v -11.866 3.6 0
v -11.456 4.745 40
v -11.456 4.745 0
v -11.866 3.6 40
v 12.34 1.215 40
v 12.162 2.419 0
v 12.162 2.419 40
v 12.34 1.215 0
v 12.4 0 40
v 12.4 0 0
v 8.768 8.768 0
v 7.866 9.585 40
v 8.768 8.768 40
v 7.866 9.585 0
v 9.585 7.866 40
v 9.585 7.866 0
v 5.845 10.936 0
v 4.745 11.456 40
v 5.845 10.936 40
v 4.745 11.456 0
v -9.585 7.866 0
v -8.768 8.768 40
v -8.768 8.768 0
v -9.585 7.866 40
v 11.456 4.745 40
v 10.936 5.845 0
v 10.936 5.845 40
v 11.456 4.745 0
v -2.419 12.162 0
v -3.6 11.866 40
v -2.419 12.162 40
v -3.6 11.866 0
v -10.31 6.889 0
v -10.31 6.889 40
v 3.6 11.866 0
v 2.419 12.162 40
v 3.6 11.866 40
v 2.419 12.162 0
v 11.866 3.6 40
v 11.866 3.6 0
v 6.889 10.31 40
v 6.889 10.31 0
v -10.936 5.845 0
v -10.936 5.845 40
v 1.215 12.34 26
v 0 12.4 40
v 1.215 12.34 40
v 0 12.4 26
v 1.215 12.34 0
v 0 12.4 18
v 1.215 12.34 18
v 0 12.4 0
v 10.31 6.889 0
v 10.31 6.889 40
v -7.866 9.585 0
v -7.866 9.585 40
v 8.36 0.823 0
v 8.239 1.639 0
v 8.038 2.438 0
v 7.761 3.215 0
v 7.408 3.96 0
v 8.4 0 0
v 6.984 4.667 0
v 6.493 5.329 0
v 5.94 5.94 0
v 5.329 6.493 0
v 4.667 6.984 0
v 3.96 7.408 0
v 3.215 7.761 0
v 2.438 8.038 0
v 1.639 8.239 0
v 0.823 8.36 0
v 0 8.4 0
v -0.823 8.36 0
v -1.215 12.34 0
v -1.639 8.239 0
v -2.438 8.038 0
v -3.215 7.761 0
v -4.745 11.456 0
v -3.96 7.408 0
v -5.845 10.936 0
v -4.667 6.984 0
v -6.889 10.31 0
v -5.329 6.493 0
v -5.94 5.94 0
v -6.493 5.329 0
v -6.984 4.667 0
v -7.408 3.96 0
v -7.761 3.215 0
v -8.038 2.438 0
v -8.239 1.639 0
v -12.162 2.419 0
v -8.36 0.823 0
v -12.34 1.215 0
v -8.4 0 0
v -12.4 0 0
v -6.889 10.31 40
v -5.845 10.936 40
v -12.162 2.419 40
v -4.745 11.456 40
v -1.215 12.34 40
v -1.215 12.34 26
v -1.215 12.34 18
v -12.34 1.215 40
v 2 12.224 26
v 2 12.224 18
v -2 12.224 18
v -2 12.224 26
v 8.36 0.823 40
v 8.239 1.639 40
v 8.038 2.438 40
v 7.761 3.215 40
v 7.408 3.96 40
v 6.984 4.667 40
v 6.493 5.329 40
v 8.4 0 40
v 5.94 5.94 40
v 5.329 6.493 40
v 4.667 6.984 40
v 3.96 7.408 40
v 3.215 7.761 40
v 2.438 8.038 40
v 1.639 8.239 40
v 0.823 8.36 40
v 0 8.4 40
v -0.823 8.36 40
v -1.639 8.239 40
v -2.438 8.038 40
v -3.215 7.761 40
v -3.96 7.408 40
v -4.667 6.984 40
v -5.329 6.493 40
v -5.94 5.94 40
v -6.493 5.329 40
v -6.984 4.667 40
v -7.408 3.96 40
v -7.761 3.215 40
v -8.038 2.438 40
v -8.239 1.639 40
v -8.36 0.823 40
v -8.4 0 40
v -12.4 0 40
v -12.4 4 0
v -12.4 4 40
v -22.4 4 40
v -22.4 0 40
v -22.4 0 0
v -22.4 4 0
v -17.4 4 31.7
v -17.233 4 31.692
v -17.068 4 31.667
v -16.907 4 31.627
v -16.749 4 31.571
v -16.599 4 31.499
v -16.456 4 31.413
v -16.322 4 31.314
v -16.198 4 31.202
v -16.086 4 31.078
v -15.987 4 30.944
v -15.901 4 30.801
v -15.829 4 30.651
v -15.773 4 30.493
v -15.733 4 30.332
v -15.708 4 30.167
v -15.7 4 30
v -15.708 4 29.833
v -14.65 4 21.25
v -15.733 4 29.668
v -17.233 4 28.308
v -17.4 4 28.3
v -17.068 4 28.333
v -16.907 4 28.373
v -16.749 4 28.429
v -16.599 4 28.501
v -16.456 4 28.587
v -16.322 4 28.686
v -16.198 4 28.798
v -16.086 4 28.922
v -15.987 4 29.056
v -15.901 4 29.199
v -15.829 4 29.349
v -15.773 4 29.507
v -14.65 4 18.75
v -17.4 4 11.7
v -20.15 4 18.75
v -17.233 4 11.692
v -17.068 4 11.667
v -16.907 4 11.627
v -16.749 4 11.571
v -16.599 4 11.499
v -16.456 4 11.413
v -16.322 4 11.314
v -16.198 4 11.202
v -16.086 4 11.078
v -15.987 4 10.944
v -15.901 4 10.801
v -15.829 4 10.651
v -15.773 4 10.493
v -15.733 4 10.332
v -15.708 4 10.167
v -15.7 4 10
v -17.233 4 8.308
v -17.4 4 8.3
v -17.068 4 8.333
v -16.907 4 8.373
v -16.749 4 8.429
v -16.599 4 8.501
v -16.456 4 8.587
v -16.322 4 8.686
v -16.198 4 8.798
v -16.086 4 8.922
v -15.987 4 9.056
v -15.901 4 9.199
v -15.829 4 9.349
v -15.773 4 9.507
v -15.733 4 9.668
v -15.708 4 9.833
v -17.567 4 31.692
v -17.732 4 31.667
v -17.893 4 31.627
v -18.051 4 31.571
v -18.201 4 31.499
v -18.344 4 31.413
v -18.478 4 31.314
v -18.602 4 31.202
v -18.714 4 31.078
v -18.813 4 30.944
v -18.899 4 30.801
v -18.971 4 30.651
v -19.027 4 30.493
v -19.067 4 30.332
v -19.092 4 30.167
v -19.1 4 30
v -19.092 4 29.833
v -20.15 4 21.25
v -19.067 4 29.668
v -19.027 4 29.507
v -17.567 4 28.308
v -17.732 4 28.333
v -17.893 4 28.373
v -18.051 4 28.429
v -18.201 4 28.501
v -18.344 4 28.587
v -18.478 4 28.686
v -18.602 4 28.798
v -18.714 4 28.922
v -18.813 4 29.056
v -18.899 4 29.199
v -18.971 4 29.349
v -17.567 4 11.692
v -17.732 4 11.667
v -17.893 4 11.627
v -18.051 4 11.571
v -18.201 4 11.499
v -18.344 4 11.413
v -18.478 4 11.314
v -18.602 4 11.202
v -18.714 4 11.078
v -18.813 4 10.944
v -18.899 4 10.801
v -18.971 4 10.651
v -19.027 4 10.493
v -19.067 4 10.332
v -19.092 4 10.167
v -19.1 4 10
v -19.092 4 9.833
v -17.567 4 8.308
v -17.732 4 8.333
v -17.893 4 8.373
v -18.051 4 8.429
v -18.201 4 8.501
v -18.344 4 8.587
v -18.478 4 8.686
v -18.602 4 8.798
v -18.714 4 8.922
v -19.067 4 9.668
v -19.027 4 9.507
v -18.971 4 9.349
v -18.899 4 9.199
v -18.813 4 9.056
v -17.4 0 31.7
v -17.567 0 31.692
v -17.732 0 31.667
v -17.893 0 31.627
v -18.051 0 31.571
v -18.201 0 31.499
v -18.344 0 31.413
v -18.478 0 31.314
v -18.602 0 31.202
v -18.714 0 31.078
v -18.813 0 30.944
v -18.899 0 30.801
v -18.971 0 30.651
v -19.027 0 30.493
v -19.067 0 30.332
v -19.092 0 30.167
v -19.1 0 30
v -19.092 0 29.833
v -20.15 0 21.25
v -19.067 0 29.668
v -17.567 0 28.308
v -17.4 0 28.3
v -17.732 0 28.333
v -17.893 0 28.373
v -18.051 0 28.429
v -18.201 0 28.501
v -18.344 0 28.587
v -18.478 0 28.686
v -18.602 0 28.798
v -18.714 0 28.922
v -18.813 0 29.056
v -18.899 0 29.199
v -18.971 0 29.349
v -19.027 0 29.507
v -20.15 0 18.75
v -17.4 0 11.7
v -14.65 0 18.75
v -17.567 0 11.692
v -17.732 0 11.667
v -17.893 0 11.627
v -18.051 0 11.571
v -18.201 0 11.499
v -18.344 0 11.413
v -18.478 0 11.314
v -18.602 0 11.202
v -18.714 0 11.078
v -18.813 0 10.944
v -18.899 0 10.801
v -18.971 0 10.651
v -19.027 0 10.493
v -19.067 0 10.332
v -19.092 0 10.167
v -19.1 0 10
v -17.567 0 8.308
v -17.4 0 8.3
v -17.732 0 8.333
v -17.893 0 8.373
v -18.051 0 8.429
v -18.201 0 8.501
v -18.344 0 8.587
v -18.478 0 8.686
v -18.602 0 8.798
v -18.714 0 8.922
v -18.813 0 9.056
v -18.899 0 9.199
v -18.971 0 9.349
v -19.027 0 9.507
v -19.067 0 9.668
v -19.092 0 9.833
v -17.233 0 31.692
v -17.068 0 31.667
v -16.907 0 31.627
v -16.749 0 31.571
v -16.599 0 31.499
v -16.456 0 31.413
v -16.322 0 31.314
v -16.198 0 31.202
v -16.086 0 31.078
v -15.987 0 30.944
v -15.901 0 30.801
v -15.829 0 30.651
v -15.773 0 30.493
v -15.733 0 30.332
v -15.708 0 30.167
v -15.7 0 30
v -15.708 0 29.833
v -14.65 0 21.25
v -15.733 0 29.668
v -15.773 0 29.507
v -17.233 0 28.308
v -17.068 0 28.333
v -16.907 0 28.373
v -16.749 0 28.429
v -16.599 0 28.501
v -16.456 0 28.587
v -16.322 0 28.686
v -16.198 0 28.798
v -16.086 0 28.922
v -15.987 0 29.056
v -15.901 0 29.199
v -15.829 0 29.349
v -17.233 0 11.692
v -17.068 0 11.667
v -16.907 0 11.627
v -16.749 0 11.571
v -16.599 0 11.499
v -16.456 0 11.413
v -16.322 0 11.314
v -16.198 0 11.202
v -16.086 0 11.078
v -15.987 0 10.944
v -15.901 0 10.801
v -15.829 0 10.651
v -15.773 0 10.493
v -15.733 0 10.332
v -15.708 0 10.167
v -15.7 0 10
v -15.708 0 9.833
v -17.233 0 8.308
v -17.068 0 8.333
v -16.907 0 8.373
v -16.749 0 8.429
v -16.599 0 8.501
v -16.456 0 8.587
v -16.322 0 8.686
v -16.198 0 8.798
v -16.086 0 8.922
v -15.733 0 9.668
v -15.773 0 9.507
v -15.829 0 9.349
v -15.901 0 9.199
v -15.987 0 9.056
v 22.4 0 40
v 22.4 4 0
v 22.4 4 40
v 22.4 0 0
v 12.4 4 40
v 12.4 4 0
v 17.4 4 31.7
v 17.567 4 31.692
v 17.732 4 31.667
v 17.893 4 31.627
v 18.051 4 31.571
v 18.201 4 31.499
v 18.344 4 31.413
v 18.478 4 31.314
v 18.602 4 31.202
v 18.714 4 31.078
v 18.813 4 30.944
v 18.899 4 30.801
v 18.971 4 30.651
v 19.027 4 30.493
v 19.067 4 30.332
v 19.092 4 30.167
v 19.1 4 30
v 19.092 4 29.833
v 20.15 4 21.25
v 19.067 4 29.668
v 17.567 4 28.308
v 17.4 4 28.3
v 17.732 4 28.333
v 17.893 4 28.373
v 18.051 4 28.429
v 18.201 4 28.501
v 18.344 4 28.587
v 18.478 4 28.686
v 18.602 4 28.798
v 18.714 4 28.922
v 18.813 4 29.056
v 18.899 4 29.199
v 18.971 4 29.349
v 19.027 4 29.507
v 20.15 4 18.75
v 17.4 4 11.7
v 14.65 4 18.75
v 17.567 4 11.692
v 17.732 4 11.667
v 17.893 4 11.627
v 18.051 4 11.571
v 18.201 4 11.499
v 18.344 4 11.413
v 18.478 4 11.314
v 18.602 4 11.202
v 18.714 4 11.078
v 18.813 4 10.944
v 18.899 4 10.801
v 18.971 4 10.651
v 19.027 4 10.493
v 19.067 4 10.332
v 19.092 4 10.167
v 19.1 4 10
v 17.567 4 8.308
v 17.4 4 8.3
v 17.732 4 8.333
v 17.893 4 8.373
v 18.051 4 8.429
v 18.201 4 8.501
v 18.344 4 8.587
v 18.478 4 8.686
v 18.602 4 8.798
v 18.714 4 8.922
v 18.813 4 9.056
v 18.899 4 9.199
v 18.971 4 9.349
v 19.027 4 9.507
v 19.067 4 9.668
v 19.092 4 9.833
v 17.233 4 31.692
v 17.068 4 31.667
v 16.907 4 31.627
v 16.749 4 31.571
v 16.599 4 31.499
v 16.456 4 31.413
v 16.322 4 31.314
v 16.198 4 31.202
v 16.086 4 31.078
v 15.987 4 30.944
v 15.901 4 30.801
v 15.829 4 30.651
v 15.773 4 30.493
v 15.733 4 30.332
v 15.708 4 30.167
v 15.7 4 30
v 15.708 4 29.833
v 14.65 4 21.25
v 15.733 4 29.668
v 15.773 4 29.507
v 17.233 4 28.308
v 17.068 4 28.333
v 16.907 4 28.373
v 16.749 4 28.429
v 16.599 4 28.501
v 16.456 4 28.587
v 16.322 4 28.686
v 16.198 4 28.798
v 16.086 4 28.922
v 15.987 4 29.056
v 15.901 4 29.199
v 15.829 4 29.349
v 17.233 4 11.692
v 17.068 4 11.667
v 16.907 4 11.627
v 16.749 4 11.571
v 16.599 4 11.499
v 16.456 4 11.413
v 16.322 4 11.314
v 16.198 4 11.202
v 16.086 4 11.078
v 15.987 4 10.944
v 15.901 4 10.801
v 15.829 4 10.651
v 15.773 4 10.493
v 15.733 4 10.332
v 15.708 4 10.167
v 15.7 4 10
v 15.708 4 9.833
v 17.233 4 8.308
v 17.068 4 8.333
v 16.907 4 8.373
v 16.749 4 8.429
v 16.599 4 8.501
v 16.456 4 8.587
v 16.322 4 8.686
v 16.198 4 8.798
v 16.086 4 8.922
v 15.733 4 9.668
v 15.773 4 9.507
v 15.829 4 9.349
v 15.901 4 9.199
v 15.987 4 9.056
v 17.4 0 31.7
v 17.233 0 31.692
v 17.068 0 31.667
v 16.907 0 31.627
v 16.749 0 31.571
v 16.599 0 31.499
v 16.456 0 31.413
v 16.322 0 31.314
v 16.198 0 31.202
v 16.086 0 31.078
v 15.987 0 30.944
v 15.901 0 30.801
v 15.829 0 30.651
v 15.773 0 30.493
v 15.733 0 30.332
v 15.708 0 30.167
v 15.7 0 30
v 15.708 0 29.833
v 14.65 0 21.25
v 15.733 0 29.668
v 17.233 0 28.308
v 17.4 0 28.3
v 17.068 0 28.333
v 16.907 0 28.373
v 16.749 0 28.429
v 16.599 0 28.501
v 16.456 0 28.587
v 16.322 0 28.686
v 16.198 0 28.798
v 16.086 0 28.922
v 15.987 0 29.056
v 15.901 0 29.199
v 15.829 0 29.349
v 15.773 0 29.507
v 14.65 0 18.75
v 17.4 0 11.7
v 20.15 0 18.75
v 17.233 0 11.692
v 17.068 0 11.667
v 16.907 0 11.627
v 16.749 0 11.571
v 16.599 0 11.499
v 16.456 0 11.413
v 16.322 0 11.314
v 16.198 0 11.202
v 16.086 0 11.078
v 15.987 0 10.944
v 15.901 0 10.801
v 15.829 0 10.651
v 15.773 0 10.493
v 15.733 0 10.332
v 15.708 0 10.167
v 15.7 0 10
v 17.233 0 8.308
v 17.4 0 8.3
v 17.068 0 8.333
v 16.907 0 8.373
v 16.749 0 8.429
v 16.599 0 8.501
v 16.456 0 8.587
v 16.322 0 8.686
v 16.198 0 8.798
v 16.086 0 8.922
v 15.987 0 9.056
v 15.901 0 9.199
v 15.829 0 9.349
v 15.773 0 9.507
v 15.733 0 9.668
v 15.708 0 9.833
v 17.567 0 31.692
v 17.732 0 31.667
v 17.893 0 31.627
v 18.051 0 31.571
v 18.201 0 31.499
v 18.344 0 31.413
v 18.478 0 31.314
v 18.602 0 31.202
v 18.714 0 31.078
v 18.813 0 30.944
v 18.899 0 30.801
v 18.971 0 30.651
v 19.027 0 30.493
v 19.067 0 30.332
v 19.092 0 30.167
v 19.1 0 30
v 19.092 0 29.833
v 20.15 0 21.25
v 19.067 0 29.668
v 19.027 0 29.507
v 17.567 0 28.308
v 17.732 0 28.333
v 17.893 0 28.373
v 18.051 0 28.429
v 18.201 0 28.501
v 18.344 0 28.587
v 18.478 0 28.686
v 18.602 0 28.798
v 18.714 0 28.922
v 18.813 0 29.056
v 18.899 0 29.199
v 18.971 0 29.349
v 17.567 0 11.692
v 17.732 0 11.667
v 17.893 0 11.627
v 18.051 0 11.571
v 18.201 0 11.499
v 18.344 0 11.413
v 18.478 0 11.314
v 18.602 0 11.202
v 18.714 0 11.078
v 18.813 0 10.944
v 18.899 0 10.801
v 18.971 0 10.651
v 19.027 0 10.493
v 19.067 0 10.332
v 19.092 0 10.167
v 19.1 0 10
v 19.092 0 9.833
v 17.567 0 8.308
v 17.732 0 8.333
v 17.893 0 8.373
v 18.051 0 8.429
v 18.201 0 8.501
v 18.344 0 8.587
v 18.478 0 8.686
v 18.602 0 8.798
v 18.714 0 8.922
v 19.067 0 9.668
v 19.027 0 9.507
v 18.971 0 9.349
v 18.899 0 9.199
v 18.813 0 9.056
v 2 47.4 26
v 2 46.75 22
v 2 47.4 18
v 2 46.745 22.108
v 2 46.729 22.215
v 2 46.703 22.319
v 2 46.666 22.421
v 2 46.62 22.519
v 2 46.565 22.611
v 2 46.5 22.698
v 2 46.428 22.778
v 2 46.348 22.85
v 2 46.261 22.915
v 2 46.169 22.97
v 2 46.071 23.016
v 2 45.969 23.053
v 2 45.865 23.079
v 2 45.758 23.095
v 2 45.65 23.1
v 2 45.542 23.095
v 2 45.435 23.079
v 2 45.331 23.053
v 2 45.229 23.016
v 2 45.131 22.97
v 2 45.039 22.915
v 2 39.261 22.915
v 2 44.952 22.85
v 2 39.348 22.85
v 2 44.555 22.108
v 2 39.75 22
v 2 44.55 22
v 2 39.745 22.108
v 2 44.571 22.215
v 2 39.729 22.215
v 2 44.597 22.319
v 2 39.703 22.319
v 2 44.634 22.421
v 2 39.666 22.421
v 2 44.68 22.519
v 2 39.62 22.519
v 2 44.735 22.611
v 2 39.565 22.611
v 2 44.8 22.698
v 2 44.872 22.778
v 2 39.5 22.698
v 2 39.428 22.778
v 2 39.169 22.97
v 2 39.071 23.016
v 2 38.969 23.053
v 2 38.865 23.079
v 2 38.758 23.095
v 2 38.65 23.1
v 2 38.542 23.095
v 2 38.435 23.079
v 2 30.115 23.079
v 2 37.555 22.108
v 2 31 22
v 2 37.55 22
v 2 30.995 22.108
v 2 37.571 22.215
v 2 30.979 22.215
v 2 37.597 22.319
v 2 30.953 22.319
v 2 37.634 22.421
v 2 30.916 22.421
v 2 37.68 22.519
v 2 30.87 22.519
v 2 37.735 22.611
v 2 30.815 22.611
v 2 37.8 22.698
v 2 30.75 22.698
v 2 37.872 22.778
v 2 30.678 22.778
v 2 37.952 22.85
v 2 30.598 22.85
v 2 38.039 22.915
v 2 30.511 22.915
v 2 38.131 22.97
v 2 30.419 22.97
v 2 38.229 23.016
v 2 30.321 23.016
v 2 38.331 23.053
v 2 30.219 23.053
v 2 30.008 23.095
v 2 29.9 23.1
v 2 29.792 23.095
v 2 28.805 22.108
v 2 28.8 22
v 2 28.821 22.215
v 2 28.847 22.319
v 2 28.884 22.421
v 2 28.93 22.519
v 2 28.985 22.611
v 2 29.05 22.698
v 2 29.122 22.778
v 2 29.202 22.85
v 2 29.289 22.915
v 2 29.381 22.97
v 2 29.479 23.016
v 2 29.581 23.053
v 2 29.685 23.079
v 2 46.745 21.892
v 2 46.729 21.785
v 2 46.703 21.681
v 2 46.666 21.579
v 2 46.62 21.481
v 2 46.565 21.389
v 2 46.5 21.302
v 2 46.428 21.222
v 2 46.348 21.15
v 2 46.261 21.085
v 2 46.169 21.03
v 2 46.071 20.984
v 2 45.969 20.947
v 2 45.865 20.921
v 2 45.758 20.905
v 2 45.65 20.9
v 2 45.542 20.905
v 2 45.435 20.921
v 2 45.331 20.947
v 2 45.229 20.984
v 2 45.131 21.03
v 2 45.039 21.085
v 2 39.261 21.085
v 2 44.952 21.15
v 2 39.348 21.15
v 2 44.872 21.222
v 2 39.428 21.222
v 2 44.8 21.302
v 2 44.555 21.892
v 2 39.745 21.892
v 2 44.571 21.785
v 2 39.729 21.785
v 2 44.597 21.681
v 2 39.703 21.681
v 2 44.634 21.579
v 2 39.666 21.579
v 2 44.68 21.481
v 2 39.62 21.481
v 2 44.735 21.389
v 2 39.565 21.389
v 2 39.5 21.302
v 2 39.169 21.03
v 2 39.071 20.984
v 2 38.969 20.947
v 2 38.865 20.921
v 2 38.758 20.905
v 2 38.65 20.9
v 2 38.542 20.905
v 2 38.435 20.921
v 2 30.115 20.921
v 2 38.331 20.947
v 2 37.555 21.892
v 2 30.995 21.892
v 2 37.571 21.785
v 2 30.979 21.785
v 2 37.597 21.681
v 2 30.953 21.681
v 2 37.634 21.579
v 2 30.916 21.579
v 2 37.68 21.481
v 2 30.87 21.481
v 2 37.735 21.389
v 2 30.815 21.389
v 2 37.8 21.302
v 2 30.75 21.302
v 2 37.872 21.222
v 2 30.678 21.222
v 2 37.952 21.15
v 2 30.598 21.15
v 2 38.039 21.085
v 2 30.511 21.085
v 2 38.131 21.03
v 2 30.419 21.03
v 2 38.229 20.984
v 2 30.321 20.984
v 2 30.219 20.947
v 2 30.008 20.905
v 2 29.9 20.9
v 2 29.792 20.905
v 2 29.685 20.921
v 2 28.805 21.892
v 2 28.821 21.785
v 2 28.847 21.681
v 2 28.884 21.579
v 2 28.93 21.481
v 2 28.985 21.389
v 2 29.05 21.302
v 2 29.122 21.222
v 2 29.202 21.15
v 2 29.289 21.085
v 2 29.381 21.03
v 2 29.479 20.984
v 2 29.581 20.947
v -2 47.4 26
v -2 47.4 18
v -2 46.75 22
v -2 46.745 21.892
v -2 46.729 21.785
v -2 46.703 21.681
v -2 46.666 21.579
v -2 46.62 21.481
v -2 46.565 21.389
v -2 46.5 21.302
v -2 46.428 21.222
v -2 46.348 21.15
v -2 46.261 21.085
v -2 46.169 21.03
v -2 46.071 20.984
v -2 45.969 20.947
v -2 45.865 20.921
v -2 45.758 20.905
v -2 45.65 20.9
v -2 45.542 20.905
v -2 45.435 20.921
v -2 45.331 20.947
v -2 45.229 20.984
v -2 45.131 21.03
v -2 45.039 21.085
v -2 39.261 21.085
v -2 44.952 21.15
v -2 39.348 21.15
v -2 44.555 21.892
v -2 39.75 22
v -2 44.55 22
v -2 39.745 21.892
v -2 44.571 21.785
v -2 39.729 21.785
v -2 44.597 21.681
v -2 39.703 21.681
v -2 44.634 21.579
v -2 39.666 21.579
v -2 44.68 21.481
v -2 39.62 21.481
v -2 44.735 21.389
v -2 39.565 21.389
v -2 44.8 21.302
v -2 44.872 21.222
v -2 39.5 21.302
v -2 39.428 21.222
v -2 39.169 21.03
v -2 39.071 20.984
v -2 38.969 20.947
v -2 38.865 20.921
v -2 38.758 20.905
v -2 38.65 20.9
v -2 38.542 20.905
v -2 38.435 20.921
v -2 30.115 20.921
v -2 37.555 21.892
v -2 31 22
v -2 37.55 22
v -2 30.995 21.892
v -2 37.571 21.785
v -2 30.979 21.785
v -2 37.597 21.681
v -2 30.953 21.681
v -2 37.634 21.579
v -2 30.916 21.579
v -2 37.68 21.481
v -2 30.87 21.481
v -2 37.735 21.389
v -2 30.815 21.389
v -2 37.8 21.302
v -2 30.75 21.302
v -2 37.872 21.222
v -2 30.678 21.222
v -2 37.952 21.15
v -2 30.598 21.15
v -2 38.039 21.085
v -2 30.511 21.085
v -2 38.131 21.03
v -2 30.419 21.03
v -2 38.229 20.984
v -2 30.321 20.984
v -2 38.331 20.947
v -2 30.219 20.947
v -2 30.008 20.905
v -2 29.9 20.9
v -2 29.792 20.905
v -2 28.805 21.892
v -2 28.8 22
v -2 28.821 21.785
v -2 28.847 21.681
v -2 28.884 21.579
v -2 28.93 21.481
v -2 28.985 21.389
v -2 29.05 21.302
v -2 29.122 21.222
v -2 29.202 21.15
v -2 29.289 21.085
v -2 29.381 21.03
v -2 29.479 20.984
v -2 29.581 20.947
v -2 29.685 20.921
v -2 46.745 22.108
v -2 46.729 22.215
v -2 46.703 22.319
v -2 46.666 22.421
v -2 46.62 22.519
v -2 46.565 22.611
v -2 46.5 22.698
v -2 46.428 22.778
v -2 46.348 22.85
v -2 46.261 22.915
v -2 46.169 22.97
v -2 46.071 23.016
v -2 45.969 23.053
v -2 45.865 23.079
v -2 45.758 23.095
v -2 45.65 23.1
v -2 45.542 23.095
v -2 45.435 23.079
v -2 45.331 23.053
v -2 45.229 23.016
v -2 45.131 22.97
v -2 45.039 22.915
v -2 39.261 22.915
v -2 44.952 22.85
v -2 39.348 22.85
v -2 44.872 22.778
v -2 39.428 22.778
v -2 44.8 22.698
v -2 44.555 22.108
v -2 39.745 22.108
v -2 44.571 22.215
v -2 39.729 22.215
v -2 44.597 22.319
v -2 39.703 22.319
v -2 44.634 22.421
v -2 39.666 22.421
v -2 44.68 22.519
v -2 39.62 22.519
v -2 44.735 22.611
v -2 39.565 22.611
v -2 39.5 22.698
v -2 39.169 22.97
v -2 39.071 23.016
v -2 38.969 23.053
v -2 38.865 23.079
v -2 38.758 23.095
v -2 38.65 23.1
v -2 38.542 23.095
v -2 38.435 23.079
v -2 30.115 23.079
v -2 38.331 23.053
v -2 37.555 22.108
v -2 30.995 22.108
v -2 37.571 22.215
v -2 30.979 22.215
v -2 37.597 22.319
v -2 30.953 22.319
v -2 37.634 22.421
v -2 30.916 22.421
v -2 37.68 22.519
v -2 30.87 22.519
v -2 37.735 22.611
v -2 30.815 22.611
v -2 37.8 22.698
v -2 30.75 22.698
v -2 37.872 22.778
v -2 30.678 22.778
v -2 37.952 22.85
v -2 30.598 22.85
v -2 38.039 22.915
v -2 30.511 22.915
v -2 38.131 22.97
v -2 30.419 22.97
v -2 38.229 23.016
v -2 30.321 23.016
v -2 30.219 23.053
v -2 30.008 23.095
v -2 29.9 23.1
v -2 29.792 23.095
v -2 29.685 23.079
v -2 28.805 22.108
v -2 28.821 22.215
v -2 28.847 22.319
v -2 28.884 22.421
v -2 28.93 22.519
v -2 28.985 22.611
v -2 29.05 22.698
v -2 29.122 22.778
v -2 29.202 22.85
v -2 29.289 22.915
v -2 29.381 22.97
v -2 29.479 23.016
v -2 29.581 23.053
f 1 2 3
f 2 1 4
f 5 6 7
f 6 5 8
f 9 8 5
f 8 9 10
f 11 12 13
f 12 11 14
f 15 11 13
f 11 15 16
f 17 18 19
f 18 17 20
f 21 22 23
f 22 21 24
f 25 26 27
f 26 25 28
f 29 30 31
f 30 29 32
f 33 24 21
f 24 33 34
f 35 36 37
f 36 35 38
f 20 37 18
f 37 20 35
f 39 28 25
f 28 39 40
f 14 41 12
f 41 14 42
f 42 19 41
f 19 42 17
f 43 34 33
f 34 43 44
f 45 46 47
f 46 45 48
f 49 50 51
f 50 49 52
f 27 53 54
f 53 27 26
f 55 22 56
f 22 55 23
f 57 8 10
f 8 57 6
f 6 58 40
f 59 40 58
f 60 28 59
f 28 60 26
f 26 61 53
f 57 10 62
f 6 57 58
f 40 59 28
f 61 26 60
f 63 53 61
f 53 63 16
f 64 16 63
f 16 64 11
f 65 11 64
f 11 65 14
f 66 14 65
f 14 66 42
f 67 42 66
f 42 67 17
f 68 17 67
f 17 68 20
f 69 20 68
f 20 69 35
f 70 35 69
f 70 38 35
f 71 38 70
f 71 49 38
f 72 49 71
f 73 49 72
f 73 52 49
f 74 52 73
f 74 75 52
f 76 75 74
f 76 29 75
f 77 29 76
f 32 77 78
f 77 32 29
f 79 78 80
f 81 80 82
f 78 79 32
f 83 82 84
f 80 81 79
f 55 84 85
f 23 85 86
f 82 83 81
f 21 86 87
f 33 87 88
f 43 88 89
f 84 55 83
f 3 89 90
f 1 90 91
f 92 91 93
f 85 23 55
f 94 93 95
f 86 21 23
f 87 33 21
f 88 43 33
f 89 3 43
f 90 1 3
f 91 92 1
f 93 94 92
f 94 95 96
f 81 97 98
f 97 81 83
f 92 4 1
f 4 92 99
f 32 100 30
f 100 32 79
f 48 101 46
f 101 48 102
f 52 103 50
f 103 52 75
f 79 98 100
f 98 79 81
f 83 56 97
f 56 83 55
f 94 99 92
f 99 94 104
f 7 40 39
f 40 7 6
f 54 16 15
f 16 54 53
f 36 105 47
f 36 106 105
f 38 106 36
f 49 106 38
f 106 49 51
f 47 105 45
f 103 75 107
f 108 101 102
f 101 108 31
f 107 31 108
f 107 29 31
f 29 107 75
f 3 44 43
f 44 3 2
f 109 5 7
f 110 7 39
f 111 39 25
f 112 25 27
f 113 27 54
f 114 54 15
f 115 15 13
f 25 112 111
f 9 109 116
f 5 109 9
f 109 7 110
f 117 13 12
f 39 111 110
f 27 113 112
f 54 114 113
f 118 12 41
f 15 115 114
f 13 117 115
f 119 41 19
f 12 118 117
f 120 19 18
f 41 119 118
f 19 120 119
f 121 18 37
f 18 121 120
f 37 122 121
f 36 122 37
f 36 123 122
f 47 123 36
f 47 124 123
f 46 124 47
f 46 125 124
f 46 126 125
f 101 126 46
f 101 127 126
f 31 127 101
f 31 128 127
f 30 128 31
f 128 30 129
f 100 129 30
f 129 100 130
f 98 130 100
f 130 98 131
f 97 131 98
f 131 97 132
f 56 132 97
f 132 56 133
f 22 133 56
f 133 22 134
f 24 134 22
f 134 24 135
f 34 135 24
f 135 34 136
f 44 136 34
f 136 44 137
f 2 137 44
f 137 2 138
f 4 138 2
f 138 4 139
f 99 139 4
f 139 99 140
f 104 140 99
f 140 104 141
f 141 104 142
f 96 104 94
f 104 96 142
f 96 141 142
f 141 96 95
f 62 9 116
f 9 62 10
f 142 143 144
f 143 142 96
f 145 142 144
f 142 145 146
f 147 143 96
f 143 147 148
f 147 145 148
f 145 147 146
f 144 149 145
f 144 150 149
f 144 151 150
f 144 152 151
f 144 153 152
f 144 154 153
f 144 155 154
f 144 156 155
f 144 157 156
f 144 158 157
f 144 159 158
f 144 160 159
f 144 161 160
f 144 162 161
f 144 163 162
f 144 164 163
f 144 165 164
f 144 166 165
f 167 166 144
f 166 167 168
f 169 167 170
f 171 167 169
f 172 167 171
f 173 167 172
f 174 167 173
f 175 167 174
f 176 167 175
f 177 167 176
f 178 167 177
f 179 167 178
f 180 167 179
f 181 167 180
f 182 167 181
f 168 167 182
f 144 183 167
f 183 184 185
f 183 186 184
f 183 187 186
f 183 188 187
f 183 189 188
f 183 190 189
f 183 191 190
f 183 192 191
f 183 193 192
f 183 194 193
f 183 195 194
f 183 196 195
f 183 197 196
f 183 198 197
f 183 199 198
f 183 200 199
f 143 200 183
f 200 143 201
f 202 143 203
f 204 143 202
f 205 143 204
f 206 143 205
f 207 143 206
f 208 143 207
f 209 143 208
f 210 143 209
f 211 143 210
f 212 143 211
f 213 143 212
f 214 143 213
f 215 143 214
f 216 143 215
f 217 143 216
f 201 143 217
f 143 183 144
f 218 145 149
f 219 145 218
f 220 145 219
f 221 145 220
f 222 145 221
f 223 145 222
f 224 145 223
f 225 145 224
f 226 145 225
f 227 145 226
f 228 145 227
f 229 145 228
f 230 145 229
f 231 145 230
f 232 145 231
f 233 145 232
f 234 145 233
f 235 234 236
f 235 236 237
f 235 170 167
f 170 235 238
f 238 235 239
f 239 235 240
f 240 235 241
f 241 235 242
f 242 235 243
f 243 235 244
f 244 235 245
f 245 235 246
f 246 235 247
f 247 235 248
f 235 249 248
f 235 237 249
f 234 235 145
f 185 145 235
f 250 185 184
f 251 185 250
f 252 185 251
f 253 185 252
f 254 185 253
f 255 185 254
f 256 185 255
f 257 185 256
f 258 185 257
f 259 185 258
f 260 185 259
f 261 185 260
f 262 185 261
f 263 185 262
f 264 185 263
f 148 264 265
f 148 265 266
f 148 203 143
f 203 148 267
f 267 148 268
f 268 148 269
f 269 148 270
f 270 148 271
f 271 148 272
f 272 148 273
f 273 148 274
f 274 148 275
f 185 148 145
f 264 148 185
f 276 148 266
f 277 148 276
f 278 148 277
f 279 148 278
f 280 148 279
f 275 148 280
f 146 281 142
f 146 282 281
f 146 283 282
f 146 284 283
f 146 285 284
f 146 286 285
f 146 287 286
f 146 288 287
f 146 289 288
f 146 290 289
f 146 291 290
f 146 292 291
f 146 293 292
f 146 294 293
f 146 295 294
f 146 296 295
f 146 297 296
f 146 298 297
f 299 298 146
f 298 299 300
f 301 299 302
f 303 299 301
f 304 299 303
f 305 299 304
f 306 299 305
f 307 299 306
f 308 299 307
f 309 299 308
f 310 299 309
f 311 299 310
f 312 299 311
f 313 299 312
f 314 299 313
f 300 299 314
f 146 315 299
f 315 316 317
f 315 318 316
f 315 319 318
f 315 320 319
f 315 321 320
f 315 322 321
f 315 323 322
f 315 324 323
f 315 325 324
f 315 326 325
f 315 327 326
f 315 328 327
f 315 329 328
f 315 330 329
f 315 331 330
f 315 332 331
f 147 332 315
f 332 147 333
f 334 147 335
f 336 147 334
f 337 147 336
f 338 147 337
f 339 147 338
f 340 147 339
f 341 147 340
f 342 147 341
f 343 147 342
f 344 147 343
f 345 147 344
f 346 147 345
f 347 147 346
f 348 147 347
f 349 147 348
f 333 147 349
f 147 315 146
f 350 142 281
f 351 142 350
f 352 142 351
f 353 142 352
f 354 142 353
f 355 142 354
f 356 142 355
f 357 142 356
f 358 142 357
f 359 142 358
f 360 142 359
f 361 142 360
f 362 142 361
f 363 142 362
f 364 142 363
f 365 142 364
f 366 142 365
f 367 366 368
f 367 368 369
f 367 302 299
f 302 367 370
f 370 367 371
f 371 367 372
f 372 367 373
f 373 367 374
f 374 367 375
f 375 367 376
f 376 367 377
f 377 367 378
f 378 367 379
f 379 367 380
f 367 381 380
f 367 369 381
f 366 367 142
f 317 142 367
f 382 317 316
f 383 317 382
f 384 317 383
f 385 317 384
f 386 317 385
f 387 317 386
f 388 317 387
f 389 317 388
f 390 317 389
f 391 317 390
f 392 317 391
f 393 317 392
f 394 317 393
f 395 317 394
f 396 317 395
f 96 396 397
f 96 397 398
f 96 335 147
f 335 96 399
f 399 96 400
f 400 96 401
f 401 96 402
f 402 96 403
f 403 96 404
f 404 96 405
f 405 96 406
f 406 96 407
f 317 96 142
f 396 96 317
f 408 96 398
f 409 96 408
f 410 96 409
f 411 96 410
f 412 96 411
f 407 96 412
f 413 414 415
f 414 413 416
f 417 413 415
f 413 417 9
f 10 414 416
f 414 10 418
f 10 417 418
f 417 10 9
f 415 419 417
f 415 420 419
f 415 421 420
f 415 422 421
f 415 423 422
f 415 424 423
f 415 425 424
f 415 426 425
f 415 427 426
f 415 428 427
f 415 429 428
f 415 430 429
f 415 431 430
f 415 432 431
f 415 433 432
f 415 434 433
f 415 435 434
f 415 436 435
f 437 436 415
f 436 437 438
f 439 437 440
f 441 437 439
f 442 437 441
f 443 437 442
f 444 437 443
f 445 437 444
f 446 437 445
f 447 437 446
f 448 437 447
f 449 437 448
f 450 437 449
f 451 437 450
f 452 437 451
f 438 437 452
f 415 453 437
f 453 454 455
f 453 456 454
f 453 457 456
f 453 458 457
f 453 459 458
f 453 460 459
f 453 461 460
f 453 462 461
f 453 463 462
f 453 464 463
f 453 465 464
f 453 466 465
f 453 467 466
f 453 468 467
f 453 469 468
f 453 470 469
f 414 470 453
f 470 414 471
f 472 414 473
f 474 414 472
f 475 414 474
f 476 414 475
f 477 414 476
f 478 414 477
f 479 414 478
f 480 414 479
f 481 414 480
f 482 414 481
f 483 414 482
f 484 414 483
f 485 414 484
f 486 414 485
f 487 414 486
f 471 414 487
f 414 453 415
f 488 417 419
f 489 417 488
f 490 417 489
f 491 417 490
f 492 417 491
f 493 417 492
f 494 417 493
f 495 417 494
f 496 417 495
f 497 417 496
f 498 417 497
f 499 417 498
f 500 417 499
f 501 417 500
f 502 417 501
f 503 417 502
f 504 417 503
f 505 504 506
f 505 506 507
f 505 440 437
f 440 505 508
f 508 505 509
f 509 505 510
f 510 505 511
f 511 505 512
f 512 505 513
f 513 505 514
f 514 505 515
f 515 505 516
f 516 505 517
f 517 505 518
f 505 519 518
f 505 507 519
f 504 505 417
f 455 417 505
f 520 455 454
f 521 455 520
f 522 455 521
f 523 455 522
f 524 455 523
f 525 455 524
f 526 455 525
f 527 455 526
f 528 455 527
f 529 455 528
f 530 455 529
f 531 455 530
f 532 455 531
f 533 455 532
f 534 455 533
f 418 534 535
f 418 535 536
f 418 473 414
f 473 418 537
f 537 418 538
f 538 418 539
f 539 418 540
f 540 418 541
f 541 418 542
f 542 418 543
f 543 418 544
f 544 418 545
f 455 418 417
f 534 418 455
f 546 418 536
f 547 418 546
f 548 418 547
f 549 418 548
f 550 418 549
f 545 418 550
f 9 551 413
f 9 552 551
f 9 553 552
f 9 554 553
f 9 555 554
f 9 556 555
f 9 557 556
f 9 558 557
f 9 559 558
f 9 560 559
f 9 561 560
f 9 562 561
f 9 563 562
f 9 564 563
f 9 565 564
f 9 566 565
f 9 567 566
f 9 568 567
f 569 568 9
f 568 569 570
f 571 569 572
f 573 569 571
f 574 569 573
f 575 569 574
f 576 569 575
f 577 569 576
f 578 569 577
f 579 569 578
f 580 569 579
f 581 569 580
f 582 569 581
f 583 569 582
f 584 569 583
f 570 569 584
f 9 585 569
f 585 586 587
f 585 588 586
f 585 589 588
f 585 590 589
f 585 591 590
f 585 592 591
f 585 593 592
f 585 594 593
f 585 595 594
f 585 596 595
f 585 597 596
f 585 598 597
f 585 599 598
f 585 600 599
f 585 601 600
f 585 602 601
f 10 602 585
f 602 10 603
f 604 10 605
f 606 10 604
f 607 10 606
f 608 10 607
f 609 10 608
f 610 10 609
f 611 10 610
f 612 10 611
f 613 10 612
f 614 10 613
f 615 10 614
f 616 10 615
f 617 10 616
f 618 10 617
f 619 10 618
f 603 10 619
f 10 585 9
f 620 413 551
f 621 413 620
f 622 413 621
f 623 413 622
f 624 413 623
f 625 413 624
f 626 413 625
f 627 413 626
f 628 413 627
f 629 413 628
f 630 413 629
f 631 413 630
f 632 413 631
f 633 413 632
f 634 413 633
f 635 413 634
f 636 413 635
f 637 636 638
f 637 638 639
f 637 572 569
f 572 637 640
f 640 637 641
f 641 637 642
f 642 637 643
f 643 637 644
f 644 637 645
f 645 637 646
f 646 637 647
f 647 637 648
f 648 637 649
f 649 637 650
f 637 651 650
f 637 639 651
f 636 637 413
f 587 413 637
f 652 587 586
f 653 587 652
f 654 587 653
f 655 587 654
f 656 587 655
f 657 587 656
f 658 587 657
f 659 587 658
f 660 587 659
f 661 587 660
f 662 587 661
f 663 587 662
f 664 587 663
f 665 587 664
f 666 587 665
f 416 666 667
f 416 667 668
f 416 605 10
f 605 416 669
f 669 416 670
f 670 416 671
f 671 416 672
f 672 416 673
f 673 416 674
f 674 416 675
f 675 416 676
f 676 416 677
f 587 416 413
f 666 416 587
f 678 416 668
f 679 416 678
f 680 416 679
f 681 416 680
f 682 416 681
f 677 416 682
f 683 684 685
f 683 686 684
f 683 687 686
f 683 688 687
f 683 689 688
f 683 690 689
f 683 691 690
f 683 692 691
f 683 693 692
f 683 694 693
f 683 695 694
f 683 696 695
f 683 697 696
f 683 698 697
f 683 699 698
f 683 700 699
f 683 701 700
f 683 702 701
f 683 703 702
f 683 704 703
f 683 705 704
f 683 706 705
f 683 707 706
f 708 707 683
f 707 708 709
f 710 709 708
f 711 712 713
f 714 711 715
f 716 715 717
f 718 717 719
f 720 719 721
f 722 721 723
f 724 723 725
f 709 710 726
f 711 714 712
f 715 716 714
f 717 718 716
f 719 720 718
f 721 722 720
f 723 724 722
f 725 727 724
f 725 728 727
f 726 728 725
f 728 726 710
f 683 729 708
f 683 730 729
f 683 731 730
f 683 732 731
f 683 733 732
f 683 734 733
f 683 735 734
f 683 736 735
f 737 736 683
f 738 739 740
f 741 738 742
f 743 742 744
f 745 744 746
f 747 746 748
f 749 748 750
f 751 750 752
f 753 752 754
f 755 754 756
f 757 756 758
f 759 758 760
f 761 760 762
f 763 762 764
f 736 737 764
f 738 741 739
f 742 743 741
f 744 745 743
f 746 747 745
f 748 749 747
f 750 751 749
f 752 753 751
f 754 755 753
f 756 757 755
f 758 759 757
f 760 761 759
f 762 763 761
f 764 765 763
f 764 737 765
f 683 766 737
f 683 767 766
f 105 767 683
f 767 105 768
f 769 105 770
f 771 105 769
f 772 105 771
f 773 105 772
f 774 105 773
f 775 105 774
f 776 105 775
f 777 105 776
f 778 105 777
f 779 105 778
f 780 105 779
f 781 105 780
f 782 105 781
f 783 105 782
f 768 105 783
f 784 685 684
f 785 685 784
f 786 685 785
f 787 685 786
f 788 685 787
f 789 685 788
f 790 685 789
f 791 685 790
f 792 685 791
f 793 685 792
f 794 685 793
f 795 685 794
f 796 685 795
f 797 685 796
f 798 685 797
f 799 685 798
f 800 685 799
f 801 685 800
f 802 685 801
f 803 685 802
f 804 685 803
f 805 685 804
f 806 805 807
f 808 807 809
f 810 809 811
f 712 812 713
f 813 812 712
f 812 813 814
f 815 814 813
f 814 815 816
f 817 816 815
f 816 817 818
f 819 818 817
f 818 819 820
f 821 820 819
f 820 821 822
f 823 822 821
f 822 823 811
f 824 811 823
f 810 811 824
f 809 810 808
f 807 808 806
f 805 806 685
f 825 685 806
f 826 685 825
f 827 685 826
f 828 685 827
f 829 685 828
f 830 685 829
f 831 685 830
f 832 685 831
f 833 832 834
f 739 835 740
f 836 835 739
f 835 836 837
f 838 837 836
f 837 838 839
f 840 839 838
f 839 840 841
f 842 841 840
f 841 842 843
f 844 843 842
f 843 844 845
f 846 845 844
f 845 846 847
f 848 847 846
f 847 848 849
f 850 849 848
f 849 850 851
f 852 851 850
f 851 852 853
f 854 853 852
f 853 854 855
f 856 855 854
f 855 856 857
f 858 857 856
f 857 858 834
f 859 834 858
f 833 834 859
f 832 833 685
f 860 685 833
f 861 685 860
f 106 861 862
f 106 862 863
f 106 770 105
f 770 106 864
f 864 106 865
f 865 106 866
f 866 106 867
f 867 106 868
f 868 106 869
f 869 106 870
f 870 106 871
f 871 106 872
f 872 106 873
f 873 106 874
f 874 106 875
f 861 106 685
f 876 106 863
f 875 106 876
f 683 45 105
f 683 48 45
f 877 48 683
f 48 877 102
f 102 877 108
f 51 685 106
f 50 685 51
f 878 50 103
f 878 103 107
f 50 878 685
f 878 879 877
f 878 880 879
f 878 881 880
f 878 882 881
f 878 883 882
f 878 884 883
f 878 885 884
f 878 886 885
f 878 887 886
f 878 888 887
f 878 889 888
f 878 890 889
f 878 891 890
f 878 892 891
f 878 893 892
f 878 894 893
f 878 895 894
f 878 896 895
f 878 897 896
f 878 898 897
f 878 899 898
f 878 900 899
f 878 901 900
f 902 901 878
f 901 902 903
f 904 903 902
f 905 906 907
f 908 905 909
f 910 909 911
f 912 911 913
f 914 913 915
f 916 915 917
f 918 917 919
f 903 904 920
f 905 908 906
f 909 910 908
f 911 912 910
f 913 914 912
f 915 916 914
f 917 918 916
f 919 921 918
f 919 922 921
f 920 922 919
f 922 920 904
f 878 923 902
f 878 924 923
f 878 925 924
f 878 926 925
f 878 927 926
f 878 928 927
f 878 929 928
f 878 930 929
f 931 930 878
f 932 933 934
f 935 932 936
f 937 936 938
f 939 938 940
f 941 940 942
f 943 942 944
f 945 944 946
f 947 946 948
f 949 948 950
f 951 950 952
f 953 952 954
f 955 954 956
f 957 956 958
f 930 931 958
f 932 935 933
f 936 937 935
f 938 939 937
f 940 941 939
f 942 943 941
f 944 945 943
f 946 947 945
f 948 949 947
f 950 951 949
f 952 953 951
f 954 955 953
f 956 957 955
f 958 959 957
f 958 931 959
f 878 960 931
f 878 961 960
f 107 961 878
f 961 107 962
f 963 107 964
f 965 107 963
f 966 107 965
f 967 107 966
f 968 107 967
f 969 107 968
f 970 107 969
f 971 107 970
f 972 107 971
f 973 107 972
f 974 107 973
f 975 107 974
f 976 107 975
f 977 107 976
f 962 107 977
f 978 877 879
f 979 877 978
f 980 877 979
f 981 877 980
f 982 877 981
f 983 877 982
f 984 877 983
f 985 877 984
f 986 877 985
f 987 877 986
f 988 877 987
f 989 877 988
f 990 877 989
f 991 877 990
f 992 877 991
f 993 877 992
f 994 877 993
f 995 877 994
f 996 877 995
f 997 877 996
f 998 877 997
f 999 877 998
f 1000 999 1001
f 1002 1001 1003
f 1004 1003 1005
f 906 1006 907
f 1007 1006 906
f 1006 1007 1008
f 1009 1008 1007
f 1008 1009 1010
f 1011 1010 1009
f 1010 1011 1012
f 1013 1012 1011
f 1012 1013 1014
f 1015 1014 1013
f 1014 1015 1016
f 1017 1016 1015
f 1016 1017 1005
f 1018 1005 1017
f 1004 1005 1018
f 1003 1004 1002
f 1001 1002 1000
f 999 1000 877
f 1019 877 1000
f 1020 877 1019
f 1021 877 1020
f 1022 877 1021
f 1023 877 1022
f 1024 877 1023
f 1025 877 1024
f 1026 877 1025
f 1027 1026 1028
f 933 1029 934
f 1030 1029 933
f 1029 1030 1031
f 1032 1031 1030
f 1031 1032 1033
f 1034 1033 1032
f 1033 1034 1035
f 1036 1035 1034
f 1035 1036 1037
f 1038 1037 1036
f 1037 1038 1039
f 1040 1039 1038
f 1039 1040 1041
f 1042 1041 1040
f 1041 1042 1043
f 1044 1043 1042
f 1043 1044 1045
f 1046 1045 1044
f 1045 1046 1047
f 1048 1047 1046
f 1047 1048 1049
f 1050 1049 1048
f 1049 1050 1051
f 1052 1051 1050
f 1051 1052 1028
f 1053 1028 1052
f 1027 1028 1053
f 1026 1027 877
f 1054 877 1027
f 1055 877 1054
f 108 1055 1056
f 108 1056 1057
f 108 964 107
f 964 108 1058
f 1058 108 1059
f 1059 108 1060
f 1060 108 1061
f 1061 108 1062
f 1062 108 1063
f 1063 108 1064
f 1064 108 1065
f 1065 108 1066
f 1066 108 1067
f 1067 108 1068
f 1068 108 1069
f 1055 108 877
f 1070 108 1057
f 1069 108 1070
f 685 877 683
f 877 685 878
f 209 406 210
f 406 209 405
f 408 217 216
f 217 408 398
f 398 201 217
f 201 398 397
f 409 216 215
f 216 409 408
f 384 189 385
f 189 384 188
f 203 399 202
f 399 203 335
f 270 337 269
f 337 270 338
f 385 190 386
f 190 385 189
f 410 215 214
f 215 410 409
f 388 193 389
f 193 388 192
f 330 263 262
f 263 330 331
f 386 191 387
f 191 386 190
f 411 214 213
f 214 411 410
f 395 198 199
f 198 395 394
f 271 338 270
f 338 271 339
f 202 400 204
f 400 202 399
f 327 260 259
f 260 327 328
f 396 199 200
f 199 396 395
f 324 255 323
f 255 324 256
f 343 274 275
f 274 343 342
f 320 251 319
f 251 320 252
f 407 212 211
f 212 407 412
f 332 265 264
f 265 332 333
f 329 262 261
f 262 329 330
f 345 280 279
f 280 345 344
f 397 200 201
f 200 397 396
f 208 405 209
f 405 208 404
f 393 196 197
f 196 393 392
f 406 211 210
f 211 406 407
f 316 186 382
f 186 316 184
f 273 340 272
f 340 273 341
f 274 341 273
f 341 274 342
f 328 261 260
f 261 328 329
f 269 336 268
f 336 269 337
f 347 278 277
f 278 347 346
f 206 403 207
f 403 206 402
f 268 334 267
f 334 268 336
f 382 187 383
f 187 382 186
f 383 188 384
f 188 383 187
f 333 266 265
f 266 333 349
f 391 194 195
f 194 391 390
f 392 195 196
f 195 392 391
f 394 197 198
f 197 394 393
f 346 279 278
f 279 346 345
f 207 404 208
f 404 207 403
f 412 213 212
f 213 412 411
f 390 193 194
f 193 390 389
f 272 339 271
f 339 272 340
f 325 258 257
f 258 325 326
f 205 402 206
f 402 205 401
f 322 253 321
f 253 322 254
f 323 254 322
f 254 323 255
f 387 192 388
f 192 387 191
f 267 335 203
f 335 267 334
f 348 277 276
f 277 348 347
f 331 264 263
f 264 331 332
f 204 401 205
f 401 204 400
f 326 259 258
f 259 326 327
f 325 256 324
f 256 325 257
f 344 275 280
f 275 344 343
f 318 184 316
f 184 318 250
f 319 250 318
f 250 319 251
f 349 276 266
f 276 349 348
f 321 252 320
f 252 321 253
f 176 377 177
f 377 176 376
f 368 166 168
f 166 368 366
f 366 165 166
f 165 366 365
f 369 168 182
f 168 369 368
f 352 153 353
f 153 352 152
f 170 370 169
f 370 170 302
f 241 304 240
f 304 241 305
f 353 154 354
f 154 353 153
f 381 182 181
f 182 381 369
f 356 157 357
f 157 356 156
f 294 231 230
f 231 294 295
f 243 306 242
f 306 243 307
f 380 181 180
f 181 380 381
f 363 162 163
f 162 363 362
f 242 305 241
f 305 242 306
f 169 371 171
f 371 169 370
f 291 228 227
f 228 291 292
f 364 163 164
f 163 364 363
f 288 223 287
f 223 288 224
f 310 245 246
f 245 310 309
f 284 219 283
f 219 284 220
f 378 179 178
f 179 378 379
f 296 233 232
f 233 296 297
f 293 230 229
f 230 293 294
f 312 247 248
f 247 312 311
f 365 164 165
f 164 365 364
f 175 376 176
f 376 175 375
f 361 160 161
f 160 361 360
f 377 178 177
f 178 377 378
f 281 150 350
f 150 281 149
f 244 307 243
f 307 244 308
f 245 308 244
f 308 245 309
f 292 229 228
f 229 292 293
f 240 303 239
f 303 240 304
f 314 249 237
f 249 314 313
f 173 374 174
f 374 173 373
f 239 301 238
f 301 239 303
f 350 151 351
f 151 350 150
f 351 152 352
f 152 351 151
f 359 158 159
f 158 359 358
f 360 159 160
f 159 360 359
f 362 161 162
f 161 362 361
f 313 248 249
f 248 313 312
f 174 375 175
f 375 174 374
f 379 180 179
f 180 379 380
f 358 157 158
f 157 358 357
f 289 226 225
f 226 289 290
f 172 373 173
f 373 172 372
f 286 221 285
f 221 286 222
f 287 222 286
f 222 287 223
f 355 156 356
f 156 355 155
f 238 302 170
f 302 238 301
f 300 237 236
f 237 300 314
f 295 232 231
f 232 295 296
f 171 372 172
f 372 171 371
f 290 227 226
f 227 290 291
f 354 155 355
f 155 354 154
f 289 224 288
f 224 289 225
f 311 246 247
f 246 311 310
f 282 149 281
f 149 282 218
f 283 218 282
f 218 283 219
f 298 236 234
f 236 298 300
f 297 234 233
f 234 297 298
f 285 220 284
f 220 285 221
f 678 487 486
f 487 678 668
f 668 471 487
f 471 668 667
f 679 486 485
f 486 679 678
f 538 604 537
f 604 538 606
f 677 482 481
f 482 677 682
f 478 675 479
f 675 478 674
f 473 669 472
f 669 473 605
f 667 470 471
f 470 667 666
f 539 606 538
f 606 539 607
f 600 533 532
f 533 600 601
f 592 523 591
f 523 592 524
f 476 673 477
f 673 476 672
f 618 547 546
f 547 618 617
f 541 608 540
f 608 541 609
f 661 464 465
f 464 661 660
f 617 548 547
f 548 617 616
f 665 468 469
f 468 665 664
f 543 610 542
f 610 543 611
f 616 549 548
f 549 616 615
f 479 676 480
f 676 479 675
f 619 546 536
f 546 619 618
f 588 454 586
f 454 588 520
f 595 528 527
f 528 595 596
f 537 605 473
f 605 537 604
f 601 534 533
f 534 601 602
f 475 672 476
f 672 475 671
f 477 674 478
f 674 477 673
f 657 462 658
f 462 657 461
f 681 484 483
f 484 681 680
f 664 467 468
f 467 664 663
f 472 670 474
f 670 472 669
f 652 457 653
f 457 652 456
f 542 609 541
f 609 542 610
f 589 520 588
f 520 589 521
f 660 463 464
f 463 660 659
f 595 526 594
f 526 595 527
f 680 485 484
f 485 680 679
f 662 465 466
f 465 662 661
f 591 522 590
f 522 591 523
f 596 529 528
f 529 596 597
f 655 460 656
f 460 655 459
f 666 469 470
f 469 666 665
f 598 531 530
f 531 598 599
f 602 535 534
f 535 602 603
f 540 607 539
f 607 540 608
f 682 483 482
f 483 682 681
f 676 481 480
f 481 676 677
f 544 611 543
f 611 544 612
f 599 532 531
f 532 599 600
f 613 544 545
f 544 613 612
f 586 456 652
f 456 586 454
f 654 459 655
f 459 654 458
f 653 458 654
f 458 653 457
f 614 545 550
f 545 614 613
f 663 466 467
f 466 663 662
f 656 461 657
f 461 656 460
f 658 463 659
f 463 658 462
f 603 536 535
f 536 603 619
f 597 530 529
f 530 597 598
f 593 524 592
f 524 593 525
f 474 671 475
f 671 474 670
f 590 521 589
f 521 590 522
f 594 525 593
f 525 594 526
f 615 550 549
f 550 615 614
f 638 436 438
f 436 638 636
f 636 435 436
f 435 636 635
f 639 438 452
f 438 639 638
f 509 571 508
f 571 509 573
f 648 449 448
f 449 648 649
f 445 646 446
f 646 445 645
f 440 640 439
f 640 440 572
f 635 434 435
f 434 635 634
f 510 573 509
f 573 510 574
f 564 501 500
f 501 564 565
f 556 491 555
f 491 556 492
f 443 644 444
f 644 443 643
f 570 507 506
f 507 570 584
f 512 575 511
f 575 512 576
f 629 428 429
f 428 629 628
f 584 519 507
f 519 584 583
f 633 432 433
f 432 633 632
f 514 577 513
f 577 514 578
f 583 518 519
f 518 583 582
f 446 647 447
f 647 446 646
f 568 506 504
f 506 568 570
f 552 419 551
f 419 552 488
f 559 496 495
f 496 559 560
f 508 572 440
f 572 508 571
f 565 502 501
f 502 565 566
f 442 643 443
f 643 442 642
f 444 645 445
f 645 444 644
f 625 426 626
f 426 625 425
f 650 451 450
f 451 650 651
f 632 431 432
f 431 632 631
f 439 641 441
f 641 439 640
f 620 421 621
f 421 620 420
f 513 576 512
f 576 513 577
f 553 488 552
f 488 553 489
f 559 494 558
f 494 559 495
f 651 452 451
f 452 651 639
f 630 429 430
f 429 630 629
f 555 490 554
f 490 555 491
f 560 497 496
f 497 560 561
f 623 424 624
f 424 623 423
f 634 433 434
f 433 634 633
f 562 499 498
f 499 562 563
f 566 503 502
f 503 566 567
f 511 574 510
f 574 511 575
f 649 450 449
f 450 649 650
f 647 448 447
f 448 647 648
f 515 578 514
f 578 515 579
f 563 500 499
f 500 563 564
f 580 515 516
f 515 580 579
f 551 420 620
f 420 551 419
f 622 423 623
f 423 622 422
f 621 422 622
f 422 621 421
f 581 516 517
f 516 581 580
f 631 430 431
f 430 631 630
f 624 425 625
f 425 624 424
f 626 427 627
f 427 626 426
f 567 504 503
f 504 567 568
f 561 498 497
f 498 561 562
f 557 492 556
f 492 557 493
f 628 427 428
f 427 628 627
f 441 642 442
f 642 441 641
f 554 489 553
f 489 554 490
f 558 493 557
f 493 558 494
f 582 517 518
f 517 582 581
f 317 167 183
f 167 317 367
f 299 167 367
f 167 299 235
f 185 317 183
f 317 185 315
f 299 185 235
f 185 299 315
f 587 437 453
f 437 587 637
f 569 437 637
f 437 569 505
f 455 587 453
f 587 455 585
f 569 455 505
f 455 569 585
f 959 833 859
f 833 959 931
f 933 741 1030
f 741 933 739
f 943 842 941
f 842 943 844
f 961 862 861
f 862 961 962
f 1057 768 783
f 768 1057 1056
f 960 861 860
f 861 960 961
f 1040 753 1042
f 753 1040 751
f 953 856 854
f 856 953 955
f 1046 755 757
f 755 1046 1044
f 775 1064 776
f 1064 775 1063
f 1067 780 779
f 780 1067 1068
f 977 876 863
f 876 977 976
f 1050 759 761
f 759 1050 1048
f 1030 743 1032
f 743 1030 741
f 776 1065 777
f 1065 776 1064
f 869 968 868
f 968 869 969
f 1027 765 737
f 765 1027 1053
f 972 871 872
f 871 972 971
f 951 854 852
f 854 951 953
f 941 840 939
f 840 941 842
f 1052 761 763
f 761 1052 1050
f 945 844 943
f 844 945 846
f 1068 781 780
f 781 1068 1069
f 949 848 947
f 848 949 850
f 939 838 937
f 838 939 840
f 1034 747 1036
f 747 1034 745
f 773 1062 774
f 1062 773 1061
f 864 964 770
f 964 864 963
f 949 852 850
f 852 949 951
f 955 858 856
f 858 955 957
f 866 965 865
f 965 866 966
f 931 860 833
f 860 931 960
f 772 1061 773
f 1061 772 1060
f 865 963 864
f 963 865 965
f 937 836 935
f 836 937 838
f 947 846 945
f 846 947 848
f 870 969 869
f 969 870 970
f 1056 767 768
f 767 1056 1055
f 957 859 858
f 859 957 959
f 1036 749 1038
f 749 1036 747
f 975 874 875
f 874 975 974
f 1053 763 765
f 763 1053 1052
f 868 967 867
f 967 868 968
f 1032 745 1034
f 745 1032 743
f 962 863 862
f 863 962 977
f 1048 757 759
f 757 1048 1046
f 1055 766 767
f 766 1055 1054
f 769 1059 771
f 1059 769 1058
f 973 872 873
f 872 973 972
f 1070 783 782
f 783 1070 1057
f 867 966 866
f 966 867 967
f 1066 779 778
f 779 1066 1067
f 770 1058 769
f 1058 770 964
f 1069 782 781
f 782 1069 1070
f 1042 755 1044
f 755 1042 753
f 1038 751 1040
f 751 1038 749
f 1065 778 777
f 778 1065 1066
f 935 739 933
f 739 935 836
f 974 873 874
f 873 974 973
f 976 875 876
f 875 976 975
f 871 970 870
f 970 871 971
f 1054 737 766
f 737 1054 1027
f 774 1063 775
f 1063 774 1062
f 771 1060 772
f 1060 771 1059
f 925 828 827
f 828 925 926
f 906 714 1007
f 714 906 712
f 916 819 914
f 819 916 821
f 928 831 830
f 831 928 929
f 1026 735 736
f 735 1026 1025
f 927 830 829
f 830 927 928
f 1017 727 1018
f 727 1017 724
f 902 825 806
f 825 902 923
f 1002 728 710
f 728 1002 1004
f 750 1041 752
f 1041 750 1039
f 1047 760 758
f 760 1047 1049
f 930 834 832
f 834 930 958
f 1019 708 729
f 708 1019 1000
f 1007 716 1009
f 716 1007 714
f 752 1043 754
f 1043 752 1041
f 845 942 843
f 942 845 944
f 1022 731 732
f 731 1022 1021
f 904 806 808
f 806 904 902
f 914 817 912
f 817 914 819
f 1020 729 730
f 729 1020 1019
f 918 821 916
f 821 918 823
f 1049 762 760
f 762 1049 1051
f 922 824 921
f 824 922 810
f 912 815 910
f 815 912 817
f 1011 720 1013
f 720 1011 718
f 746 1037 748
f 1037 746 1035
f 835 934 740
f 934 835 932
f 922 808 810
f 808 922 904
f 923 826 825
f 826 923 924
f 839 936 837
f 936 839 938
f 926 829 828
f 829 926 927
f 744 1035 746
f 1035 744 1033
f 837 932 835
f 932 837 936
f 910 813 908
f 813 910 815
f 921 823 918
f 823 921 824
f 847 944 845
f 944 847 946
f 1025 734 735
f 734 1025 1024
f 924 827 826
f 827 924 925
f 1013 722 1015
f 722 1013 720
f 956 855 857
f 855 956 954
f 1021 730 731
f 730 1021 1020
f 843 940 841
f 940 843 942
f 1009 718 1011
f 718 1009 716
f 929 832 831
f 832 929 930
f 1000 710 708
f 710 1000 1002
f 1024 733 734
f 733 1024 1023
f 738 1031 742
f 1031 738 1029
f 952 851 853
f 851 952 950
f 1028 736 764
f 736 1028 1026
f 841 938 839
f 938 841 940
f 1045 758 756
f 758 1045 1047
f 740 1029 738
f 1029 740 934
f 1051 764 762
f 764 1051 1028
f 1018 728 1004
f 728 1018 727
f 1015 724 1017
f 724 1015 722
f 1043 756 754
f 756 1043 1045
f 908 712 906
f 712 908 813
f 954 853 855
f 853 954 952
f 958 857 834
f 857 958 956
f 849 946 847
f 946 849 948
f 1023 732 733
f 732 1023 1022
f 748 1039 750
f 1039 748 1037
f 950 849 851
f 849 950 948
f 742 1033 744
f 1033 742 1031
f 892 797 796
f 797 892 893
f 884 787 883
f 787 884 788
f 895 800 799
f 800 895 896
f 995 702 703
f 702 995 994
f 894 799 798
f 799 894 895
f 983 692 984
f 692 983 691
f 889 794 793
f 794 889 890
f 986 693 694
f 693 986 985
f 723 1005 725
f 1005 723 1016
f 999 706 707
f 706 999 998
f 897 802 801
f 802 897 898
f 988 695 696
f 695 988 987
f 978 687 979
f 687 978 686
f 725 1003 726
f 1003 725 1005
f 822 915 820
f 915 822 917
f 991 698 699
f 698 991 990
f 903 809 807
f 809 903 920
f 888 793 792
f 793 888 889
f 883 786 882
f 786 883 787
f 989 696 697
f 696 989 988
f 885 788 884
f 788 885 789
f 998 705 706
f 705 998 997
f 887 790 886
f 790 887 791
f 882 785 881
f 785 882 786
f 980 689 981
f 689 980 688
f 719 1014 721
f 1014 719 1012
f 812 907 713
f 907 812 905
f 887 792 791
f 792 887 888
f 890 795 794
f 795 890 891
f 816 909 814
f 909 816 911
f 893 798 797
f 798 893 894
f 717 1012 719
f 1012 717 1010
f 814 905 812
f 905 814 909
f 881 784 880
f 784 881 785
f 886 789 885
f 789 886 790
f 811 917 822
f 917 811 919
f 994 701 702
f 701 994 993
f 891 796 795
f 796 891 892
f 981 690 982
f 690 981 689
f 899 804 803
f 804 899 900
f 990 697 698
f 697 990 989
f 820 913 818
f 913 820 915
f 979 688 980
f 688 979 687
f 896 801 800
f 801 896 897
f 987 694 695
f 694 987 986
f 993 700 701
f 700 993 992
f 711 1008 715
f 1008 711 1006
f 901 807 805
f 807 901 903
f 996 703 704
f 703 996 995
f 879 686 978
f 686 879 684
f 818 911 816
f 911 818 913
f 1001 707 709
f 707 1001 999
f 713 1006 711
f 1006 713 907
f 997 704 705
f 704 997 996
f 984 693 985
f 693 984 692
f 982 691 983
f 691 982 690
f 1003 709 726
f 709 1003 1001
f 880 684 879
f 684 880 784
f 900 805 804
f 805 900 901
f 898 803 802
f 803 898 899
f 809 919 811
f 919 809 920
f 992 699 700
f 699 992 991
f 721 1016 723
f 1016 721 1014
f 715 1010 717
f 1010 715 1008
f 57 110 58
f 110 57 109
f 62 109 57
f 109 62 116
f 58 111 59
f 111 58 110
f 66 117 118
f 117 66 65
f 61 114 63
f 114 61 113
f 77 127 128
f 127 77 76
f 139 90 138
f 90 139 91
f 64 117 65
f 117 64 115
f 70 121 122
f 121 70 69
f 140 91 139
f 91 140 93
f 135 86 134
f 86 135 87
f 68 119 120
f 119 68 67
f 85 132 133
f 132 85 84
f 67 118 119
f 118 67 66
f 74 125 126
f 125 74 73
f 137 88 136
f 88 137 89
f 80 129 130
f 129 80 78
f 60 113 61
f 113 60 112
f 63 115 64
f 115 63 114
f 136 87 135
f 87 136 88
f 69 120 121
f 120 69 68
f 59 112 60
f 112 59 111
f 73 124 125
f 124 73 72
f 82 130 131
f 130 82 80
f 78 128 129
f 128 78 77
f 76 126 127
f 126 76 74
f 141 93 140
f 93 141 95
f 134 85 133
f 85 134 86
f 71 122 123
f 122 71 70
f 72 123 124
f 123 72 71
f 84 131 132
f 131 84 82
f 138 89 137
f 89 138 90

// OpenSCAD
// FollowCam — tripod handle clamp + servo leg bracket
// Parametric OpenSCAD. PLACEHOLDER DIMENSIONS — replace from cad/MEASUREMENTS.md
// before slicing. Print: PLA/PETG, 0.2–0.28mm layers, 25–35% infill, no supports.
//
// Render one part at a time via PART, export STL:
//   PART = "clamp_top" | "clamp_bottom" | "servo_bracket"

PART = "clamp_bottom";

/* ---------- measured on the real tripod (EDIT THESE) ---------- */
handle_d      = 16;    // handle outer diameter at clamp point (mm)
leg_d         = 24;    // leg/column tube diameter where bracket straps on
/* ---------- servo (MG996R-class defaults; SG90 = 23 x 12.2 body) ---------- */
servo_body_l  = 40.7;  // along the long axis
servo_body_w  = 19.7;
servo_body_h  = 36;    // below the mounting flange
/* ---------- tunables ---------- */
clamp_len     = 40;    // length of clamp along the handle
wall          = 4;
tab_w         = 10;    // bolt/zip-tie flange width
bolt_d        = 3.4;   // M3 clearance
arm_len       = 35;    // pushrod arm sticking off the clamp
rod_hole_d    = 2.2;   // pushrod wire holes (multiple radii for tuning)
fit_tol       = 0.4;   // radial slop; increase if clamp won't close on rubber grip
ziptie_w      = 5.5;
ziptie_t      = 2.5;
$fn = 64;

bore_r  = handle_d/2 + fit_tol;
outer_r = bore_r + wall;

/* One clamshell half: half-pipe + two side flanges with bolt/zip-tie slots. */
module clamp_half(with_arm=false) {
  difference() {
    union() {
      // half cylinder shell
      difference() {
        cylinder(r=outer_r, h=clamp_len, center=false);
        translate([-outer_r-1, -2*outer_r, -1]) cube([2*outer_r+2, 2*outer_r, clamp_len+2]);
      }
      // flanges
      for (sx = [-1, 1])
        translate([sx*(outer_r + tab_w/2) - tab_w/2, 0, 0])
          cube([tab_w, wall, clamp_len]);
      // pushrod arm (on one half only), sticking radially up from the shell
      if (with_arm)
        translate([-wall/2, outer_r - 1, clamp_len/2 - wall/2])
          cube([wall, arm_len + 1, wall*2]);
    }
    // bore
    translate([0, 0, -1]) cylinder(r=bore_r, h=clamp_len+2);
    // two bolt holes + a zip-tie slot per flange
    for (sx = [-1, 1]) {
      for (z = [clamp_len*0.25, clamp_len*0.75])
        translate([sx*(outer_r + tab_w/2), -1, z])
          rotate([-90, 0, 0]) cylinder(d=bolt_d, h=wall+2);
      translate([sx*(outer_r + tab_w/2) - ziptie_w/2, -1, clamp_len/2 - ziptie_t/2])
        cube([ziptie_w, wall+2, ziptie_t]);
    }
    // pushrod holes along the arm at three radii (linkage tuning)
    if (with_arm)
      for (y = [outer_r + arm_len*0.5, outer_r + arm_len*0.75, outer_r + arm_len*0.95])
        translate([-wall/2 - 1, y, clamp_len/2 + wall/2])
          rotate([0, 90, 0]) cylinder(d=rod_hole_d, h=wall+2);
  }
}

/* Servo cradle with a V-notch base that zip-ties to the tripod leg. */
module servo_bracket() {
  cw = servo_body_w + 2*wall;
  cl = servo_body_l + 2*wall;
  ch = 16;                       // cradle side height — servo held by zip ties over top
  base_h = 14;
  difference() {
    union() {
      translate([0, 0, base_h]) cube([cl, cw, ch]);        // cradle walls block
      cube([cl, cw, base_h]);                              // base block
    }
    // servo pocket
    translate([wall, wall, base_h]) cube([servo_body_l, servo_body_w, ch+1]);
    // V-groove along the base underside to seat on the round leg
    translate([-1, cw/2, -leg_d*0.18])
      rotate([45, 0, 0]) rotate([0, 90, 0])
        cube([leg_d, leg_d, cl+2], center=false);
    // zip-tie tunnels: two through the base (strap to leg), two through walls (strap servo)
    for (x = [cl*0.2, cl*0.8]) {
      translate([x - ziptie_t/2, -1, base_h*0.45]) cube([ziptie_t, cw+2, ziptie_w]);
      translate([x - ziptie_t/2, -1, base_h + ch*0.5]) cube([ziptie_t, cw+2, ziptie_w]);
    }
  }
}

if (PART == "clamp_top")     clamp_half(with_arm=false);
if (PART == "clamp_bottom")  clamp_half(with_arm=true);
if (PART == "servo_bracket") servo_bracket();
